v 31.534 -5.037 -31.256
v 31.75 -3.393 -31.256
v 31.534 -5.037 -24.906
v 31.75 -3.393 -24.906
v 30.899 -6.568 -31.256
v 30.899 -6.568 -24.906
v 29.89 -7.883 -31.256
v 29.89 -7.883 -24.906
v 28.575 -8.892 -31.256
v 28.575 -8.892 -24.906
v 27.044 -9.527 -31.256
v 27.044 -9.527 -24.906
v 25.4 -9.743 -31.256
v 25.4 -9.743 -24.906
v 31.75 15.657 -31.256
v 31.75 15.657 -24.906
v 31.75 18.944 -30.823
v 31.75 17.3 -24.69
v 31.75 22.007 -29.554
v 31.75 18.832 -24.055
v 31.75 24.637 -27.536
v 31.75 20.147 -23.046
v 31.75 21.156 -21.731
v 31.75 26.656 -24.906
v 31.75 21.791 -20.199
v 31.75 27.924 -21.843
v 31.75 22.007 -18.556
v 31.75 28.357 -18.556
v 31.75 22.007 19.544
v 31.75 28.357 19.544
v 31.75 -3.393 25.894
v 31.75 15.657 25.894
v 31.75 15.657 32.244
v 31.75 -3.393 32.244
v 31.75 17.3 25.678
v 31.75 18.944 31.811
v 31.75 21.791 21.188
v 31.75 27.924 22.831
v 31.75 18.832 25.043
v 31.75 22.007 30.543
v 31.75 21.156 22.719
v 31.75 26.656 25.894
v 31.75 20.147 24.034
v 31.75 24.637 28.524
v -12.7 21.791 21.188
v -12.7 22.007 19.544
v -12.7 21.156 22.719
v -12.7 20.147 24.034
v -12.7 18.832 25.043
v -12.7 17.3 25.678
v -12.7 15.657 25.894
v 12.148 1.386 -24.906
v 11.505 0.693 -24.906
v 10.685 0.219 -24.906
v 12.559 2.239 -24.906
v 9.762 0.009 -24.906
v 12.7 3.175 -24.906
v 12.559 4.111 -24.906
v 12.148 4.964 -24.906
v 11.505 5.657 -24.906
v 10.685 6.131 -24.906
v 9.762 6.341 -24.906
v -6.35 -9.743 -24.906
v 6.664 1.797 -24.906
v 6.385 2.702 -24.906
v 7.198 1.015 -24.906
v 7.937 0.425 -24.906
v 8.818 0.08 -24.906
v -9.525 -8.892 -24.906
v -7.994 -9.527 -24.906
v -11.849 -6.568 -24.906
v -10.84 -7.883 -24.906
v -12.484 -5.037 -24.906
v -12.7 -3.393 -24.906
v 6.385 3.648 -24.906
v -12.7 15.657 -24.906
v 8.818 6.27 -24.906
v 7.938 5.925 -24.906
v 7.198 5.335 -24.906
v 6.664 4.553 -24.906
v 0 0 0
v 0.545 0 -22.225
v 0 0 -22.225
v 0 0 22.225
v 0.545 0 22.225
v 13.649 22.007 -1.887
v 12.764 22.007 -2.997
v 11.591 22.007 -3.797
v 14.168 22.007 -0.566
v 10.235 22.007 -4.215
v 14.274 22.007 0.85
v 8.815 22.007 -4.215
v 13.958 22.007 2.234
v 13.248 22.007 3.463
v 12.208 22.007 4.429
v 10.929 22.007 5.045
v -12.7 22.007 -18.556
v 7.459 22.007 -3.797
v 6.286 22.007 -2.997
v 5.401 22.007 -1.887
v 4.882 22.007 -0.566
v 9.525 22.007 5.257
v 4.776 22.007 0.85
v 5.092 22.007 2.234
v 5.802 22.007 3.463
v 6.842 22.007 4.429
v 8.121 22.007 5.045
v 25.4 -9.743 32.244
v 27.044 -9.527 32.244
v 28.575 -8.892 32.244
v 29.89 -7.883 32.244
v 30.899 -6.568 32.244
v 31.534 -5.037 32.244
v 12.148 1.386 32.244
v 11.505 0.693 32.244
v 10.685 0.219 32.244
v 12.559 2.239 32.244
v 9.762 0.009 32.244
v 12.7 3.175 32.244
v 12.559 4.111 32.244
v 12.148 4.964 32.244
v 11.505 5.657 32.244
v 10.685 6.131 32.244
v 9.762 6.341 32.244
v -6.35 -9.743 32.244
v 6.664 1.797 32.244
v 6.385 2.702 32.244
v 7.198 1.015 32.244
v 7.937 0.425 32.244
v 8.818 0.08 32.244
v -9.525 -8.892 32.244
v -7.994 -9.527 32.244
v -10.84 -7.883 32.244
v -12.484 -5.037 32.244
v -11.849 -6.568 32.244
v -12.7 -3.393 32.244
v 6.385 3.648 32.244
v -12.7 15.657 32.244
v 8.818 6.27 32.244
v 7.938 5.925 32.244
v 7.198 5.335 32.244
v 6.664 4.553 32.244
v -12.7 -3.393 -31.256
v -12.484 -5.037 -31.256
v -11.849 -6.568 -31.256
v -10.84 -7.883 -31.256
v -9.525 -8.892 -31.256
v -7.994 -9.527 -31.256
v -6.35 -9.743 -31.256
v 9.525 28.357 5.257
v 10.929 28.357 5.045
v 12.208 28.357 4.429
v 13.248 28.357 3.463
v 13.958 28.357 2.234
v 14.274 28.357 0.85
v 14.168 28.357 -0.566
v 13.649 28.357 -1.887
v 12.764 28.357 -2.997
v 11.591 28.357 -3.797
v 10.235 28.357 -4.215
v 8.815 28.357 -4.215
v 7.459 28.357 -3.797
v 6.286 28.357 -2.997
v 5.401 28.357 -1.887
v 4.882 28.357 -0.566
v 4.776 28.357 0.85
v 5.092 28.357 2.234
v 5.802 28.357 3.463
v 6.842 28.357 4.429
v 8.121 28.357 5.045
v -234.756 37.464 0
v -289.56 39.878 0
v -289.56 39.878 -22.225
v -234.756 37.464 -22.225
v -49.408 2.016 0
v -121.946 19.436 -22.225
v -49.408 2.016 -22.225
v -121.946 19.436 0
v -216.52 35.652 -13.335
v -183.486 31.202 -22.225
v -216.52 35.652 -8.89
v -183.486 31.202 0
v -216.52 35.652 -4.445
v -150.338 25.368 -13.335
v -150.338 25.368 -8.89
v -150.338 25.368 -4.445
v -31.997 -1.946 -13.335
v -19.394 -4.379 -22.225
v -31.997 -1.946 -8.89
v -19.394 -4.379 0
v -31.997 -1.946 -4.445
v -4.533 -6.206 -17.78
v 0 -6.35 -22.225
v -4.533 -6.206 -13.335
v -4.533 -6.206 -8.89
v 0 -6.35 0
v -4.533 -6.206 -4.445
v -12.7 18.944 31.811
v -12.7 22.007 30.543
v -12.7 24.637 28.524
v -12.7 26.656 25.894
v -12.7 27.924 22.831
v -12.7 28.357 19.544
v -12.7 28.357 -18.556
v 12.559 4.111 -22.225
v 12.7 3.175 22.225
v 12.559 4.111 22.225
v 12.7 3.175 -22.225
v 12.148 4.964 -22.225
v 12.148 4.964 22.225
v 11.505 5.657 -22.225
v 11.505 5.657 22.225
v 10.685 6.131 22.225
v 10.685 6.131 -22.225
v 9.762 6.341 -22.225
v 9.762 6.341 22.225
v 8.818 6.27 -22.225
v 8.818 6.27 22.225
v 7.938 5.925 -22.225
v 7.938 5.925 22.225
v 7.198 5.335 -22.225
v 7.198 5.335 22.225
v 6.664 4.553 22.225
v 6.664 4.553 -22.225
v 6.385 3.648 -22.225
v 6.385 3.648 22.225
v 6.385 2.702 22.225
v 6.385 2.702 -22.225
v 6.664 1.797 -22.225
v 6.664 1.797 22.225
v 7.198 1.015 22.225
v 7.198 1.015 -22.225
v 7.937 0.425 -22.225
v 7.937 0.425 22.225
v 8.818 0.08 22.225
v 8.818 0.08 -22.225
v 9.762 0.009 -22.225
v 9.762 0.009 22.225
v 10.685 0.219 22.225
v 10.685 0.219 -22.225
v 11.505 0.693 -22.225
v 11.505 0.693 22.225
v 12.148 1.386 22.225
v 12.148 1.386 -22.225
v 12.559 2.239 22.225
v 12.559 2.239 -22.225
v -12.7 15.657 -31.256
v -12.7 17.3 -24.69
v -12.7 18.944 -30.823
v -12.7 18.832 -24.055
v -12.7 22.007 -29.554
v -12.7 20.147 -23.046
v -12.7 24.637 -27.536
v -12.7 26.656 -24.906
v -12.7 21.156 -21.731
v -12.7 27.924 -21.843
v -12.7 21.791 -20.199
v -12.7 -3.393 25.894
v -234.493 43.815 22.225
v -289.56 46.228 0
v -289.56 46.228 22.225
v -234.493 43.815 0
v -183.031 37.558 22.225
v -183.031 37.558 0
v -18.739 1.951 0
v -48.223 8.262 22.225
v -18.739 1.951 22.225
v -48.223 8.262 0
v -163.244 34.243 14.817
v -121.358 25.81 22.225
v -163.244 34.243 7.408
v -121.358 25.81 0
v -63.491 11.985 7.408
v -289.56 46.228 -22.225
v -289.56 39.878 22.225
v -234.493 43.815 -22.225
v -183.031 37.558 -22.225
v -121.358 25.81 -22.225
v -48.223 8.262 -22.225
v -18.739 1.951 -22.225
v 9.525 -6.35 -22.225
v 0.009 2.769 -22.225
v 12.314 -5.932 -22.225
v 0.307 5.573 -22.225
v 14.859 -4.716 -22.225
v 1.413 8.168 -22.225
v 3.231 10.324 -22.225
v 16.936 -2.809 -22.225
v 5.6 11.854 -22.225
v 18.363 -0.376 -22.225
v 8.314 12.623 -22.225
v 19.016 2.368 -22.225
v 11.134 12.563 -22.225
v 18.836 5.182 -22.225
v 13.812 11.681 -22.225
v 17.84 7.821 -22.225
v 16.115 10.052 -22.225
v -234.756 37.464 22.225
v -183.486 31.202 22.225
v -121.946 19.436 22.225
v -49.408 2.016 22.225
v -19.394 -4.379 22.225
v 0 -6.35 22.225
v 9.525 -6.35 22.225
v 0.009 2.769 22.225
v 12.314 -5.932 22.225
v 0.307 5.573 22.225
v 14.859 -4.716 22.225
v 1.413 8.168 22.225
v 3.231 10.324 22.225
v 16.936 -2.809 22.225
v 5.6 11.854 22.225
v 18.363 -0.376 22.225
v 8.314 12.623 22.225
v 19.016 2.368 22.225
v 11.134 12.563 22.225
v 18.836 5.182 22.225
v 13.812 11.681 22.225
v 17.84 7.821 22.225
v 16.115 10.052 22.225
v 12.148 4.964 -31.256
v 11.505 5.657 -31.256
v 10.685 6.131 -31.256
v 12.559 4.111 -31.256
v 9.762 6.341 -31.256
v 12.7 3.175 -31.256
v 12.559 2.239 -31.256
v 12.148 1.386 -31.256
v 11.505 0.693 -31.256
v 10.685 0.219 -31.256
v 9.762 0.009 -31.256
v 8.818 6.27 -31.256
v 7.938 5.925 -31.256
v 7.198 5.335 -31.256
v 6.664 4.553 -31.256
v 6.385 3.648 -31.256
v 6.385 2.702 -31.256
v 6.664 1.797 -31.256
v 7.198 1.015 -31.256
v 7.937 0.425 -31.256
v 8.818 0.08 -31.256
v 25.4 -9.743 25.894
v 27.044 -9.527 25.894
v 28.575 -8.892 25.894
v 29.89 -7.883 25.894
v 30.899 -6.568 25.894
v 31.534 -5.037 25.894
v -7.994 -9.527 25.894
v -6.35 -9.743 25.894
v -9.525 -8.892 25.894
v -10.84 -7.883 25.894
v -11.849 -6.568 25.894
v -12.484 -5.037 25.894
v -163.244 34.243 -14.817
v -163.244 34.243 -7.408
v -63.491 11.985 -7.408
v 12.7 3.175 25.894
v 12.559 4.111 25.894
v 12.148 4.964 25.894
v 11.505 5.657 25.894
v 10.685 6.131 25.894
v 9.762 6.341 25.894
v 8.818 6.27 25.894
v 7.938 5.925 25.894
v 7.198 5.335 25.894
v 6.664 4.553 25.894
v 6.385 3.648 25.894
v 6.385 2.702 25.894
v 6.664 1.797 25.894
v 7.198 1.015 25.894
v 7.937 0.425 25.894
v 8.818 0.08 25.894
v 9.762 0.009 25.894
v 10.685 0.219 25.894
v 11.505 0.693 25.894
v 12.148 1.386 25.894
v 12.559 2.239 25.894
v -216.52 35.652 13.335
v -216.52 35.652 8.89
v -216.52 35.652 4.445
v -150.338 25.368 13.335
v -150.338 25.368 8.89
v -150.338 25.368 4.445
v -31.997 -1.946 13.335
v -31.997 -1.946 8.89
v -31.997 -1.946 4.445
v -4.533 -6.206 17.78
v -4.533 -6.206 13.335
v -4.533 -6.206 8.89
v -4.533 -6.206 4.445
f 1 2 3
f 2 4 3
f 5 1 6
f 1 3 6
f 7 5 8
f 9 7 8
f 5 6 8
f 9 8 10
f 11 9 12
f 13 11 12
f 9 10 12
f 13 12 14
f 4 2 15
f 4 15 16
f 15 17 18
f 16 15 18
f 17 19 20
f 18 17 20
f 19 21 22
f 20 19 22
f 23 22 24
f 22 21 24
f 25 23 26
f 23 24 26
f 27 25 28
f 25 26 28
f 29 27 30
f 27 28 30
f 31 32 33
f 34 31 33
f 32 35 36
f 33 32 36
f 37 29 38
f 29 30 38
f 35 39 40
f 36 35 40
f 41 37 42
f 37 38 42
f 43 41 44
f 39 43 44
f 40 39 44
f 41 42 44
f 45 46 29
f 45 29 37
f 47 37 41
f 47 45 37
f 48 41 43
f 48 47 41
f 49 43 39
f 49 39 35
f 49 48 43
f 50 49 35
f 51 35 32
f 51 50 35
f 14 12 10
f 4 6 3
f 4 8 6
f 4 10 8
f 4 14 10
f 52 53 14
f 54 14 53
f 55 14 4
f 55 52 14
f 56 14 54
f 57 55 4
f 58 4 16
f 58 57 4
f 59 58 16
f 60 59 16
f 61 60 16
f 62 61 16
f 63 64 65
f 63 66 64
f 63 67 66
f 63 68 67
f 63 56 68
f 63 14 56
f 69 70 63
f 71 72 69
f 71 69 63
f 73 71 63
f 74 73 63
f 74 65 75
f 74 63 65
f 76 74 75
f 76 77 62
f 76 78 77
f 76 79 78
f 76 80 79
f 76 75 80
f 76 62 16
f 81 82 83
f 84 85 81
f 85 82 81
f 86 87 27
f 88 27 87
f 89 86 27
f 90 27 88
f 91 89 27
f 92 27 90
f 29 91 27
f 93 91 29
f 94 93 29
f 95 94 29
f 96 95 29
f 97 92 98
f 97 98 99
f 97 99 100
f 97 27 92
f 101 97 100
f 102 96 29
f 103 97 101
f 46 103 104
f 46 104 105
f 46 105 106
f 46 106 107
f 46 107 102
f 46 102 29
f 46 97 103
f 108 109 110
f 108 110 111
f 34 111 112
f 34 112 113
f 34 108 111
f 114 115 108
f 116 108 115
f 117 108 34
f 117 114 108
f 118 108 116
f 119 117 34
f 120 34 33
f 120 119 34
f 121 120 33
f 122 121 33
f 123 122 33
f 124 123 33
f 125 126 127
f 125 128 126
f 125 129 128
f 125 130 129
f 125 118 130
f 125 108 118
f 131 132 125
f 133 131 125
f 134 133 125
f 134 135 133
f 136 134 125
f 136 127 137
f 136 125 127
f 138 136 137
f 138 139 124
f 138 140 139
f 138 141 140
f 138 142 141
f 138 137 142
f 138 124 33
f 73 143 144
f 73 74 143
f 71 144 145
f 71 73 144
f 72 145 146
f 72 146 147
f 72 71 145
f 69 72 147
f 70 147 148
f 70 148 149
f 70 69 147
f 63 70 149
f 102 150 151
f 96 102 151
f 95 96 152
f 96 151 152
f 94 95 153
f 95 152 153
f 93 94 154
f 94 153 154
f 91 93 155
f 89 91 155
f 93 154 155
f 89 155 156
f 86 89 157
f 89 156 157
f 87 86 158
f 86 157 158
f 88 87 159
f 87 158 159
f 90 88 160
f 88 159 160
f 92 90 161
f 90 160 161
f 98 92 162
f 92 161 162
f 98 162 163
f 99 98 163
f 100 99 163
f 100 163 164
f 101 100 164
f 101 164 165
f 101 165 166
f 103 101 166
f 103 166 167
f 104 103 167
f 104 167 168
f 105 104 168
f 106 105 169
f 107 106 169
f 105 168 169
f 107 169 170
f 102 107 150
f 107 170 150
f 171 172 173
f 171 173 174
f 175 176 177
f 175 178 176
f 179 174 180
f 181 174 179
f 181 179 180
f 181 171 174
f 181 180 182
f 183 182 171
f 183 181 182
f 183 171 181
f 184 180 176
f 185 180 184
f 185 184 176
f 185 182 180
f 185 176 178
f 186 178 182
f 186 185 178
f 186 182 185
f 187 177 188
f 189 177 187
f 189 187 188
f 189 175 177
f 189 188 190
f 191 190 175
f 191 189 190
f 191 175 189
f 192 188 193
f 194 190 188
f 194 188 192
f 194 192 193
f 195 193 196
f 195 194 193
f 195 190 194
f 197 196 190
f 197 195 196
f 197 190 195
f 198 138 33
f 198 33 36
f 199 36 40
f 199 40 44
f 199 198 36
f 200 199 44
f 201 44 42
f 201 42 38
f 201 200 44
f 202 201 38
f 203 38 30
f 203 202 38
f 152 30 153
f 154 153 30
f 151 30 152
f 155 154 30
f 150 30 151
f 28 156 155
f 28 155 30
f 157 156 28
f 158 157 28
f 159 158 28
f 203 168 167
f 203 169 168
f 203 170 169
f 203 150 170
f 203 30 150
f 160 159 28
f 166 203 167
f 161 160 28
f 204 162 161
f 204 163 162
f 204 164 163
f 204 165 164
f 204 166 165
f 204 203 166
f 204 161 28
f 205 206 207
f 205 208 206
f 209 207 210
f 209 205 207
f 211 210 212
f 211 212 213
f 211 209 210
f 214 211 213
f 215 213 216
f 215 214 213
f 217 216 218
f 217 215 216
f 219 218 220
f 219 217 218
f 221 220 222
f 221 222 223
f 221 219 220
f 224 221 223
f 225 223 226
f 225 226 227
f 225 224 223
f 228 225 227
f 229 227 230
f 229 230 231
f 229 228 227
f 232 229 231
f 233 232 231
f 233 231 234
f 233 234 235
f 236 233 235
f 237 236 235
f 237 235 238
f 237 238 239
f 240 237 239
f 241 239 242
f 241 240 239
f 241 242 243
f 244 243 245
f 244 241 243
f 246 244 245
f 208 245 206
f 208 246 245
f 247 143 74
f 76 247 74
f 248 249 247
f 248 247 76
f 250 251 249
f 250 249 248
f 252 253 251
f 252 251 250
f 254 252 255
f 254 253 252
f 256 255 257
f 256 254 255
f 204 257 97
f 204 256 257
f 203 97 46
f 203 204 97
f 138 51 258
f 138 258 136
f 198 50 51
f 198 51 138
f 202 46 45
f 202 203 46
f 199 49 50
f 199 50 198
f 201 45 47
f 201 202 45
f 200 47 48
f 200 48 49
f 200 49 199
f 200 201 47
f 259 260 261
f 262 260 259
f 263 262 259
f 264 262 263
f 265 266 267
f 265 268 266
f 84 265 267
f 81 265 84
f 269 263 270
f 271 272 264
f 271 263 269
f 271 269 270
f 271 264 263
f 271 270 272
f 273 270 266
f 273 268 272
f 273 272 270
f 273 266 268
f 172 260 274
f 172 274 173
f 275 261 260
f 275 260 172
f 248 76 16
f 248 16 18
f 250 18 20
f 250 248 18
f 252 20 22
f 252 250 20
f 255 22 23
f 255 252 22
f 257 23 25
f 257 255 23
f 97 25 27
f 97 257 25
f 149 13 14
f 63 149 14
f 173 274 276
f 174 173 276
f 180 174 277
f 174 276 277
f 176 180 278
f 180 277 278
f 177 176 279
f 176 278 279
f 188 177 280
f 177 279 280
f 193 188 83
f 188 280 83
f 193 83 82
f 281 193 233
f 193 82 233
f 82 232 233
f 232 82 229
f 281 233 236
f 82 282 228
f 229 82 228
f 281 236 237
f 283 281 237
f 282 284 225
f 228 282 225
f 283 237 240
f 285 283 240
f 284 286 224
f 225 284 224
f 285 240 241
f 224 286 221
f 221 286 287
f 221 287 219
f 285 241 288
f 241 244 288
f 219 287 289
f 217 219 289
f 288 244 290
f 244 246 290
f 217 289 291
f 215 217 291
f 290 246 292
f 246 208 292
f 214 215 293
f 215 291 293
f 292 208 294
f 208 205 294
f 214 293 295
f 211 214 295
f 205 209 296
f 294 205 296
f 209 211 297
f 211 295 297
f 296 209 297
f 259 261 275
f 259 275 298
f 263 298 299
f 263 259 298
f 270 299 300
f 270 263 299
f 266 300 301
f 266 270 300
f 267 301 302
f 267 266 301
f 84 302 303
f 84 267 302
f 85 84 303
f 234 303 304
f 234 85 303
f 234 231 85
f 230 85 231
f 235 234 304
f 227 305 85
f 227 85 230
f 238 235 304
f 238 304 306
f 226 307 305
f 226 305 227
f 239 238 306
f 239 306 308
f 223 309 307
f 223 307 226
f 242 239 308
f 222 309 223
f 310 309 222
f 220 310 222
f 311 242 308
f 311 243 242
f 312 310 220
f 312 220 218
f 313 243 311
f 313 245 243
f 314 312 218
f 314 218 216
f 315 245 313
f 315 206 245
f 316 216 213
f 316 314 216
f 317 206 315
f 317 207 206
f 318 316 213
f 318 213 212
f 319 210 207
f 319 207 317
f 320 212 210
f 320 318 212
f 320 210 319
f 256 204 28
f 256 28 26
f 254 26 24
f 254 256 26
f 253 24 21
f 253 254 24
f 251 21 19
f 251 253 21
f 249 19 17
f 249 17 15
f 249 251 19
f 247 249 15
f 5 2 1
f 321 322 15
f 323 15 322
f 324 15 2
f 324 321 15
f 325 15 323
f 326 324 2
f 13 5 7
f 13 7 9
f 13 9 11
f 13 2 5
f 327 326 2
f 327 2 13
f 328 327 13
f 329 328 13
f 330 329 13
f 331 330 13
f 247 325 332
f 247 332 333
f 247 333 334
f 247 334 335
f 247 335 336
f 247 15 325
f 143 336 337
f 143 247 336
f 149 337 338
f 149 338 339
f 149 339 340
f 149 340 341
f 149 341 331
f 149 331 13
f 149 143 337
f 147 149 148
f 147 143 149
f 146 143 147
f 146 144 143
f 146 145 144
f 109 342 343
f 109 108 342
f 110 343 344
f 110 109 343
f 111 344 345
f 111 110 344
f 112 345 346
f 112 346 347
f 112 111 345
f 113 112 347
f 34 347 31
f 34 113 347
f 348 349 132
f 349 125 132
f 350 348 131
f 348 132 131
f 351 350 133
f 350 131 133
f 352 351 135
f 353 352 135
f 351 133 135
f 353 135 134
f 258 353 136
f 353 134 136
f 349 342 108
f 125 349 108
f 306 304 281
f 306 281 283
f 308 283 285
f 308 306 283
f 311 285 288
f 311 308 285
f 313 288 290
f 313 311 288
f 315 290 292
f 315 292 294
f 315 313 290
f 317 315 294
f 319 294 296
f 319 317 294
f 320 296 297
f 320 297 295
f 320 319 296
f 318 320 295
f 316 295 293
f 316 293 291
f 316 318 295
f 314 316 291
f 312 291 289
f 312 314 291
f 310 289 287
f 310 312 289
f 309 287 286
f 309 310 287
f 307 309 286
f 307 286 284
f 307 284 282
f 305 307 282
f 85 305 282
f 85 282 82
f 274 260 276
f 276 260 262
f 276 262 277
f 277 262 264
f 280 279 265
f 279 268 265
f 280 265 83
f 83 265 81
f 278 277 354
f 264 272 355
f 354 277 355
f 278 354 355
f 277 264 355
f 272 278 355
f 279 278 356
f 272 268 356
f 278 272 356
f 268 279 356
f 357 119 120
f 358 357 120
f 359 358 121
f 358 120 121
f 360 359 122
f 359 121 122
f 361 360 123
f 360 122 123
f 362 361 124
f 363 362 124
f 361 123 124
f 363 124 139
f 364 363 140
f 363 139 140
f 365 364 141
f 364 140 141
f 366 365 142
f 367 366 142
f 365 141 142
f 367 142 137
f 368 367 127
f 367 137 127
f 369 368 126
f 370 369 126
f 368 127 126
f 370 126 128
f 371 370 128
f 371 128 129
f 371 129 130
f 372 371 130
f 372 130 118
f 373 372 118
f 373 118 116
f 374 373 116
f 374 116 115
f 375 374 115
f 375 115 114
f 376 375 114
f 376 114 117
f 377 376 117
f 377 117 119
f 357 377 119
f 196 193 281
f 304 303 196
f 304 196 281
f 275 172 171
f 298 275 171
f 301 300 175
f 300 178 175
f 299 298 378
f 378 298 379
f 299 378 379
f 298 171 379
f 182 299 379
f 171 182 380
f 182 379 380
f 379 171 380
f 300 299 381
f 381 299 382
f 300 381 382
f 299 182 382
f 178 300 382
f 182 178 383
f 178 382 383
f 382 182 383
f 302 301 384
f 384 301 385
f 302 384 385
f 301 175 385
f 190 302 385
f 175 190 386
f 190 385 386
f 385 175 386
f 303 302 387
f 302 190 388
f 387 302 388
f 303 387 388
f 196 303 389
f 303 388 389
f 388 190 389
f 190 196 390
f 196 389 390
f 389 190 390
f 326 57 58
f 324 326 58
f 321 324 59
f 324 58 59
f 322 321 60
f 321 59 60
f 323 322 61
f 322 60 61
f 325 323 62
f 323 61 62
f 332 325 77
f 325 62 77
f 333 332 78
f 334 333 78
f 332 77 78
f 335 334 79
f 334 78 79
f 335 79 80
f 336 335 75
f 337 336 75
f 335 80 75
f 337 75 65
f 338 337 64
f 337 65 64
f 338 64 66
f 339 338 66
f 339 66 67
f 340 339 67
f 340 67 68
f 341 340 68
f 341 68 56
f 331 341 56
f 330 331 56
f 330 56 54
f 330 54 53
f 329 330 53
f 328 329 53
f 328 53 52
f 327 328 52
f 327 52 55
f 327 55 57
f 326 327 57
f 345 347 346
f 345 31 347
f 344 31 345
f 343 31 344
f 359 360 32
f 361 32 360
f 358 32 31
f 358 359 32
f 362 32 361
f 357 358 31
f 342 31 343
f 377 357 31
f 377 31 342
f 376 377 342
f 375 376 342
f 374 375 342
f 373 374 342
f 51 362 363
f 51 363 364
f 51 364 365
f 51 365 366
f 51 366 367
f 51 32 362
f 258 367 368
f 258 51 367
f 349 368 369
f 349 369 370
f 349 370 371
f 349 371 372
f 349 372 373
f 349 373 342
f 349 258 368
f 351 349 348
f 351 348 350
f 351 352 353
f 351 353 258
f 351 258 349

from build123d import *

# Parameters (mm, degrees)
SKETCH1_R           = 3.175
BOSS_EXTRUDE1_DEPTH = 22.225
EXTRUDE_THIN1_START = -12.7
EXTRUDE_THIN1_DEPTH = 44.45
SKETCH3_R           = 3.175
CUT_EXTRUDE1_DEPTH  = 301.023785142
FILLET1_R           = 6.35
SKETCH4_R           = 4.7625
CUT_EXTRUDE2_DEPTH  = 6.35


with BuildPart() as part:
    # Sketch1 → Boss-Extrude1 (new, symmetric)
    with BuildSketch(Plane.XY):
        with BuildLine():
            Line((-289.56, 46.228), (-289.56, 39.878))
            add(Edge.make_bspline(
                [(-289.56, 39.878), (-287.457708774, 39.878), (-283.244388722, 39.855665269), (-274.888346659, 39.72442276), (-264.530135649, 39.403232114), (-252.262197223, 38.782989217), (-236.126058345, 37.665070109), (-216.392784617, 35.763744796), (-193.474726614, 32.809033629), (-171.382325609, 29.314543407), (-143.111028194, 24.11348997), (-110.15189314, 16.930344434), (-80.779143513, 9.728615394), (-59.665965857, 4.489135204), (-45.075862357, 0.953293749), (-31.776445337, -2.055863029), (-21.796607379, -4.013222514), (-14.47880752, -5.179232924), (-9.317799197, -5.834727867), (-5.290609247, -6.180931611), (-2.210944405, -6.324967238), (-0.743079937, -6.35), (0, -6.35)],
                knots=[0, 0, 0, 0, 0.015625, 0.03125, 0.0625, 0.09375, 0.125, 0.1875, 0.25, 0.3125, 0.375, 0.5, 0.625, 0.6875, 0.75, 0.8125, 0.875, 0.90625, 0.9375, 0.96875, 0.984375, 1, 1, 1, 1], degree=3))
            Line((0, -6.35), (9.525, -6.35))
            ThreePointArc((9.525, -6.35), (15.024261314, 10.952129933), (0.544743879, 0))
            Line((0.544743879, 0), (0, 0))
            add(Edge.make_bspline(
                [(-289.56, 46.228), (-153.195442893, 46.228), (-42.127920077, 0), (0, 0)],
                knots=[0, 0, 0, 0, 1, 1, 1, 1], degree=3))
        make_face()
        with Locations((9.525, 3.175)):
            Circle(SKETCH1_R, mode=Mode.SUBTRACT)
    extrude(amount=BOSS_EXTRUDE1_DEPTH, both=True)


with BuildPart() as body_2:
    # Sketch2 → Extrude-Thin1 (new body)
    with BuildSketch(Plane(origin=(0, 0, 0), x_dir=(0, 0, -1), z_dir=(1, 0, 0)).offset(EXTRUDE_THIN1_START)):
        with BuildLine():
            Line((-32.244028337, -9.743002829), (-32.244028337, 15.656997171))
            ThreePointArc((-32.244028337, 15.656997171), (-28.524284458, 24.637253292), (-19.544028337, 28.356997171))
            Line((-19.544028337, 28.356997171), (18.555971663, 28.356997171))
            ThreePointArc((18.555971663, 28.356997171), (27.536227785, 24.637253292), (31.255971663, 15.656997171))
            Line((31.255971663, 15.656997171), (31.255971663, -9.743002829))
            Line((31.255971663, -9.743002829), (24.905971663, -9.743002829))
            Line((24.905971663, -9.743002829), (24.905971663, 15.656997171))
            ThreePointArc((24.905971663, 15.656997171), (23.046099724, 20.147125231), (18.555971663, 22.006997171))
            Line((18.555971663, 22.006997171), (-19.544028337, 22.006997171))
            ThreePointArc((-19.544028337, 22.006997171), (-24.034156397, 20.147125231), (-25.894028337, 15.656997171))
            Line((-25.894028337, 15.656997171), (-25.894028337, -9.743002829))
            Line((-25.894028337, -9.743002829), (-32.244028337, -9.743002829))
        make_face()
    extrude(amount=EXTRUDE_THIN1_DEPTH)

    # Sketch3 → Cut-Extrude1 (cut, through all)
    with BuildSketch(Plane.XY.offset(32.244028337)):
        with Locations((9.525, 3.175)):
            Circle(SKETCH3_R)
    extrude(amount=-CUT_EXTRUDE1_DEPTH, mode=Mode.SUBTRACT)

    # Fillet1
    fillet1_edges = [body_2.edges().sort_by_distance(p)[0] for p in [
        (-12.7, -9.743002829, 29.069028337),
        (-12.7, -9.743002829, -28.080971663),
        (31.75, -9.743002829, 29.069028337),
        (31.75, -9.743002829, -28.080971663),
    ]]
    fillet(fillet1_edges, radius=FILLET1_R)

    # Sketch4 → Cut-Extrude2 (cut)
    with BuildSketch(Plane(origin=(0, 28.356997171, 0), x_dir=(1, 0, 0), z_dir=(0, 1, 0))):
        with Locations(Location((9.525, -0.494028337, 0), (0, 0, 270))):
            Circle(SKETCH4_R)
    extrude(amount=-CUT_EXTRUDE2_DEPTH, mode=Mode.SUBTRACT)


solid = Compound([part.part, body_2.part])
